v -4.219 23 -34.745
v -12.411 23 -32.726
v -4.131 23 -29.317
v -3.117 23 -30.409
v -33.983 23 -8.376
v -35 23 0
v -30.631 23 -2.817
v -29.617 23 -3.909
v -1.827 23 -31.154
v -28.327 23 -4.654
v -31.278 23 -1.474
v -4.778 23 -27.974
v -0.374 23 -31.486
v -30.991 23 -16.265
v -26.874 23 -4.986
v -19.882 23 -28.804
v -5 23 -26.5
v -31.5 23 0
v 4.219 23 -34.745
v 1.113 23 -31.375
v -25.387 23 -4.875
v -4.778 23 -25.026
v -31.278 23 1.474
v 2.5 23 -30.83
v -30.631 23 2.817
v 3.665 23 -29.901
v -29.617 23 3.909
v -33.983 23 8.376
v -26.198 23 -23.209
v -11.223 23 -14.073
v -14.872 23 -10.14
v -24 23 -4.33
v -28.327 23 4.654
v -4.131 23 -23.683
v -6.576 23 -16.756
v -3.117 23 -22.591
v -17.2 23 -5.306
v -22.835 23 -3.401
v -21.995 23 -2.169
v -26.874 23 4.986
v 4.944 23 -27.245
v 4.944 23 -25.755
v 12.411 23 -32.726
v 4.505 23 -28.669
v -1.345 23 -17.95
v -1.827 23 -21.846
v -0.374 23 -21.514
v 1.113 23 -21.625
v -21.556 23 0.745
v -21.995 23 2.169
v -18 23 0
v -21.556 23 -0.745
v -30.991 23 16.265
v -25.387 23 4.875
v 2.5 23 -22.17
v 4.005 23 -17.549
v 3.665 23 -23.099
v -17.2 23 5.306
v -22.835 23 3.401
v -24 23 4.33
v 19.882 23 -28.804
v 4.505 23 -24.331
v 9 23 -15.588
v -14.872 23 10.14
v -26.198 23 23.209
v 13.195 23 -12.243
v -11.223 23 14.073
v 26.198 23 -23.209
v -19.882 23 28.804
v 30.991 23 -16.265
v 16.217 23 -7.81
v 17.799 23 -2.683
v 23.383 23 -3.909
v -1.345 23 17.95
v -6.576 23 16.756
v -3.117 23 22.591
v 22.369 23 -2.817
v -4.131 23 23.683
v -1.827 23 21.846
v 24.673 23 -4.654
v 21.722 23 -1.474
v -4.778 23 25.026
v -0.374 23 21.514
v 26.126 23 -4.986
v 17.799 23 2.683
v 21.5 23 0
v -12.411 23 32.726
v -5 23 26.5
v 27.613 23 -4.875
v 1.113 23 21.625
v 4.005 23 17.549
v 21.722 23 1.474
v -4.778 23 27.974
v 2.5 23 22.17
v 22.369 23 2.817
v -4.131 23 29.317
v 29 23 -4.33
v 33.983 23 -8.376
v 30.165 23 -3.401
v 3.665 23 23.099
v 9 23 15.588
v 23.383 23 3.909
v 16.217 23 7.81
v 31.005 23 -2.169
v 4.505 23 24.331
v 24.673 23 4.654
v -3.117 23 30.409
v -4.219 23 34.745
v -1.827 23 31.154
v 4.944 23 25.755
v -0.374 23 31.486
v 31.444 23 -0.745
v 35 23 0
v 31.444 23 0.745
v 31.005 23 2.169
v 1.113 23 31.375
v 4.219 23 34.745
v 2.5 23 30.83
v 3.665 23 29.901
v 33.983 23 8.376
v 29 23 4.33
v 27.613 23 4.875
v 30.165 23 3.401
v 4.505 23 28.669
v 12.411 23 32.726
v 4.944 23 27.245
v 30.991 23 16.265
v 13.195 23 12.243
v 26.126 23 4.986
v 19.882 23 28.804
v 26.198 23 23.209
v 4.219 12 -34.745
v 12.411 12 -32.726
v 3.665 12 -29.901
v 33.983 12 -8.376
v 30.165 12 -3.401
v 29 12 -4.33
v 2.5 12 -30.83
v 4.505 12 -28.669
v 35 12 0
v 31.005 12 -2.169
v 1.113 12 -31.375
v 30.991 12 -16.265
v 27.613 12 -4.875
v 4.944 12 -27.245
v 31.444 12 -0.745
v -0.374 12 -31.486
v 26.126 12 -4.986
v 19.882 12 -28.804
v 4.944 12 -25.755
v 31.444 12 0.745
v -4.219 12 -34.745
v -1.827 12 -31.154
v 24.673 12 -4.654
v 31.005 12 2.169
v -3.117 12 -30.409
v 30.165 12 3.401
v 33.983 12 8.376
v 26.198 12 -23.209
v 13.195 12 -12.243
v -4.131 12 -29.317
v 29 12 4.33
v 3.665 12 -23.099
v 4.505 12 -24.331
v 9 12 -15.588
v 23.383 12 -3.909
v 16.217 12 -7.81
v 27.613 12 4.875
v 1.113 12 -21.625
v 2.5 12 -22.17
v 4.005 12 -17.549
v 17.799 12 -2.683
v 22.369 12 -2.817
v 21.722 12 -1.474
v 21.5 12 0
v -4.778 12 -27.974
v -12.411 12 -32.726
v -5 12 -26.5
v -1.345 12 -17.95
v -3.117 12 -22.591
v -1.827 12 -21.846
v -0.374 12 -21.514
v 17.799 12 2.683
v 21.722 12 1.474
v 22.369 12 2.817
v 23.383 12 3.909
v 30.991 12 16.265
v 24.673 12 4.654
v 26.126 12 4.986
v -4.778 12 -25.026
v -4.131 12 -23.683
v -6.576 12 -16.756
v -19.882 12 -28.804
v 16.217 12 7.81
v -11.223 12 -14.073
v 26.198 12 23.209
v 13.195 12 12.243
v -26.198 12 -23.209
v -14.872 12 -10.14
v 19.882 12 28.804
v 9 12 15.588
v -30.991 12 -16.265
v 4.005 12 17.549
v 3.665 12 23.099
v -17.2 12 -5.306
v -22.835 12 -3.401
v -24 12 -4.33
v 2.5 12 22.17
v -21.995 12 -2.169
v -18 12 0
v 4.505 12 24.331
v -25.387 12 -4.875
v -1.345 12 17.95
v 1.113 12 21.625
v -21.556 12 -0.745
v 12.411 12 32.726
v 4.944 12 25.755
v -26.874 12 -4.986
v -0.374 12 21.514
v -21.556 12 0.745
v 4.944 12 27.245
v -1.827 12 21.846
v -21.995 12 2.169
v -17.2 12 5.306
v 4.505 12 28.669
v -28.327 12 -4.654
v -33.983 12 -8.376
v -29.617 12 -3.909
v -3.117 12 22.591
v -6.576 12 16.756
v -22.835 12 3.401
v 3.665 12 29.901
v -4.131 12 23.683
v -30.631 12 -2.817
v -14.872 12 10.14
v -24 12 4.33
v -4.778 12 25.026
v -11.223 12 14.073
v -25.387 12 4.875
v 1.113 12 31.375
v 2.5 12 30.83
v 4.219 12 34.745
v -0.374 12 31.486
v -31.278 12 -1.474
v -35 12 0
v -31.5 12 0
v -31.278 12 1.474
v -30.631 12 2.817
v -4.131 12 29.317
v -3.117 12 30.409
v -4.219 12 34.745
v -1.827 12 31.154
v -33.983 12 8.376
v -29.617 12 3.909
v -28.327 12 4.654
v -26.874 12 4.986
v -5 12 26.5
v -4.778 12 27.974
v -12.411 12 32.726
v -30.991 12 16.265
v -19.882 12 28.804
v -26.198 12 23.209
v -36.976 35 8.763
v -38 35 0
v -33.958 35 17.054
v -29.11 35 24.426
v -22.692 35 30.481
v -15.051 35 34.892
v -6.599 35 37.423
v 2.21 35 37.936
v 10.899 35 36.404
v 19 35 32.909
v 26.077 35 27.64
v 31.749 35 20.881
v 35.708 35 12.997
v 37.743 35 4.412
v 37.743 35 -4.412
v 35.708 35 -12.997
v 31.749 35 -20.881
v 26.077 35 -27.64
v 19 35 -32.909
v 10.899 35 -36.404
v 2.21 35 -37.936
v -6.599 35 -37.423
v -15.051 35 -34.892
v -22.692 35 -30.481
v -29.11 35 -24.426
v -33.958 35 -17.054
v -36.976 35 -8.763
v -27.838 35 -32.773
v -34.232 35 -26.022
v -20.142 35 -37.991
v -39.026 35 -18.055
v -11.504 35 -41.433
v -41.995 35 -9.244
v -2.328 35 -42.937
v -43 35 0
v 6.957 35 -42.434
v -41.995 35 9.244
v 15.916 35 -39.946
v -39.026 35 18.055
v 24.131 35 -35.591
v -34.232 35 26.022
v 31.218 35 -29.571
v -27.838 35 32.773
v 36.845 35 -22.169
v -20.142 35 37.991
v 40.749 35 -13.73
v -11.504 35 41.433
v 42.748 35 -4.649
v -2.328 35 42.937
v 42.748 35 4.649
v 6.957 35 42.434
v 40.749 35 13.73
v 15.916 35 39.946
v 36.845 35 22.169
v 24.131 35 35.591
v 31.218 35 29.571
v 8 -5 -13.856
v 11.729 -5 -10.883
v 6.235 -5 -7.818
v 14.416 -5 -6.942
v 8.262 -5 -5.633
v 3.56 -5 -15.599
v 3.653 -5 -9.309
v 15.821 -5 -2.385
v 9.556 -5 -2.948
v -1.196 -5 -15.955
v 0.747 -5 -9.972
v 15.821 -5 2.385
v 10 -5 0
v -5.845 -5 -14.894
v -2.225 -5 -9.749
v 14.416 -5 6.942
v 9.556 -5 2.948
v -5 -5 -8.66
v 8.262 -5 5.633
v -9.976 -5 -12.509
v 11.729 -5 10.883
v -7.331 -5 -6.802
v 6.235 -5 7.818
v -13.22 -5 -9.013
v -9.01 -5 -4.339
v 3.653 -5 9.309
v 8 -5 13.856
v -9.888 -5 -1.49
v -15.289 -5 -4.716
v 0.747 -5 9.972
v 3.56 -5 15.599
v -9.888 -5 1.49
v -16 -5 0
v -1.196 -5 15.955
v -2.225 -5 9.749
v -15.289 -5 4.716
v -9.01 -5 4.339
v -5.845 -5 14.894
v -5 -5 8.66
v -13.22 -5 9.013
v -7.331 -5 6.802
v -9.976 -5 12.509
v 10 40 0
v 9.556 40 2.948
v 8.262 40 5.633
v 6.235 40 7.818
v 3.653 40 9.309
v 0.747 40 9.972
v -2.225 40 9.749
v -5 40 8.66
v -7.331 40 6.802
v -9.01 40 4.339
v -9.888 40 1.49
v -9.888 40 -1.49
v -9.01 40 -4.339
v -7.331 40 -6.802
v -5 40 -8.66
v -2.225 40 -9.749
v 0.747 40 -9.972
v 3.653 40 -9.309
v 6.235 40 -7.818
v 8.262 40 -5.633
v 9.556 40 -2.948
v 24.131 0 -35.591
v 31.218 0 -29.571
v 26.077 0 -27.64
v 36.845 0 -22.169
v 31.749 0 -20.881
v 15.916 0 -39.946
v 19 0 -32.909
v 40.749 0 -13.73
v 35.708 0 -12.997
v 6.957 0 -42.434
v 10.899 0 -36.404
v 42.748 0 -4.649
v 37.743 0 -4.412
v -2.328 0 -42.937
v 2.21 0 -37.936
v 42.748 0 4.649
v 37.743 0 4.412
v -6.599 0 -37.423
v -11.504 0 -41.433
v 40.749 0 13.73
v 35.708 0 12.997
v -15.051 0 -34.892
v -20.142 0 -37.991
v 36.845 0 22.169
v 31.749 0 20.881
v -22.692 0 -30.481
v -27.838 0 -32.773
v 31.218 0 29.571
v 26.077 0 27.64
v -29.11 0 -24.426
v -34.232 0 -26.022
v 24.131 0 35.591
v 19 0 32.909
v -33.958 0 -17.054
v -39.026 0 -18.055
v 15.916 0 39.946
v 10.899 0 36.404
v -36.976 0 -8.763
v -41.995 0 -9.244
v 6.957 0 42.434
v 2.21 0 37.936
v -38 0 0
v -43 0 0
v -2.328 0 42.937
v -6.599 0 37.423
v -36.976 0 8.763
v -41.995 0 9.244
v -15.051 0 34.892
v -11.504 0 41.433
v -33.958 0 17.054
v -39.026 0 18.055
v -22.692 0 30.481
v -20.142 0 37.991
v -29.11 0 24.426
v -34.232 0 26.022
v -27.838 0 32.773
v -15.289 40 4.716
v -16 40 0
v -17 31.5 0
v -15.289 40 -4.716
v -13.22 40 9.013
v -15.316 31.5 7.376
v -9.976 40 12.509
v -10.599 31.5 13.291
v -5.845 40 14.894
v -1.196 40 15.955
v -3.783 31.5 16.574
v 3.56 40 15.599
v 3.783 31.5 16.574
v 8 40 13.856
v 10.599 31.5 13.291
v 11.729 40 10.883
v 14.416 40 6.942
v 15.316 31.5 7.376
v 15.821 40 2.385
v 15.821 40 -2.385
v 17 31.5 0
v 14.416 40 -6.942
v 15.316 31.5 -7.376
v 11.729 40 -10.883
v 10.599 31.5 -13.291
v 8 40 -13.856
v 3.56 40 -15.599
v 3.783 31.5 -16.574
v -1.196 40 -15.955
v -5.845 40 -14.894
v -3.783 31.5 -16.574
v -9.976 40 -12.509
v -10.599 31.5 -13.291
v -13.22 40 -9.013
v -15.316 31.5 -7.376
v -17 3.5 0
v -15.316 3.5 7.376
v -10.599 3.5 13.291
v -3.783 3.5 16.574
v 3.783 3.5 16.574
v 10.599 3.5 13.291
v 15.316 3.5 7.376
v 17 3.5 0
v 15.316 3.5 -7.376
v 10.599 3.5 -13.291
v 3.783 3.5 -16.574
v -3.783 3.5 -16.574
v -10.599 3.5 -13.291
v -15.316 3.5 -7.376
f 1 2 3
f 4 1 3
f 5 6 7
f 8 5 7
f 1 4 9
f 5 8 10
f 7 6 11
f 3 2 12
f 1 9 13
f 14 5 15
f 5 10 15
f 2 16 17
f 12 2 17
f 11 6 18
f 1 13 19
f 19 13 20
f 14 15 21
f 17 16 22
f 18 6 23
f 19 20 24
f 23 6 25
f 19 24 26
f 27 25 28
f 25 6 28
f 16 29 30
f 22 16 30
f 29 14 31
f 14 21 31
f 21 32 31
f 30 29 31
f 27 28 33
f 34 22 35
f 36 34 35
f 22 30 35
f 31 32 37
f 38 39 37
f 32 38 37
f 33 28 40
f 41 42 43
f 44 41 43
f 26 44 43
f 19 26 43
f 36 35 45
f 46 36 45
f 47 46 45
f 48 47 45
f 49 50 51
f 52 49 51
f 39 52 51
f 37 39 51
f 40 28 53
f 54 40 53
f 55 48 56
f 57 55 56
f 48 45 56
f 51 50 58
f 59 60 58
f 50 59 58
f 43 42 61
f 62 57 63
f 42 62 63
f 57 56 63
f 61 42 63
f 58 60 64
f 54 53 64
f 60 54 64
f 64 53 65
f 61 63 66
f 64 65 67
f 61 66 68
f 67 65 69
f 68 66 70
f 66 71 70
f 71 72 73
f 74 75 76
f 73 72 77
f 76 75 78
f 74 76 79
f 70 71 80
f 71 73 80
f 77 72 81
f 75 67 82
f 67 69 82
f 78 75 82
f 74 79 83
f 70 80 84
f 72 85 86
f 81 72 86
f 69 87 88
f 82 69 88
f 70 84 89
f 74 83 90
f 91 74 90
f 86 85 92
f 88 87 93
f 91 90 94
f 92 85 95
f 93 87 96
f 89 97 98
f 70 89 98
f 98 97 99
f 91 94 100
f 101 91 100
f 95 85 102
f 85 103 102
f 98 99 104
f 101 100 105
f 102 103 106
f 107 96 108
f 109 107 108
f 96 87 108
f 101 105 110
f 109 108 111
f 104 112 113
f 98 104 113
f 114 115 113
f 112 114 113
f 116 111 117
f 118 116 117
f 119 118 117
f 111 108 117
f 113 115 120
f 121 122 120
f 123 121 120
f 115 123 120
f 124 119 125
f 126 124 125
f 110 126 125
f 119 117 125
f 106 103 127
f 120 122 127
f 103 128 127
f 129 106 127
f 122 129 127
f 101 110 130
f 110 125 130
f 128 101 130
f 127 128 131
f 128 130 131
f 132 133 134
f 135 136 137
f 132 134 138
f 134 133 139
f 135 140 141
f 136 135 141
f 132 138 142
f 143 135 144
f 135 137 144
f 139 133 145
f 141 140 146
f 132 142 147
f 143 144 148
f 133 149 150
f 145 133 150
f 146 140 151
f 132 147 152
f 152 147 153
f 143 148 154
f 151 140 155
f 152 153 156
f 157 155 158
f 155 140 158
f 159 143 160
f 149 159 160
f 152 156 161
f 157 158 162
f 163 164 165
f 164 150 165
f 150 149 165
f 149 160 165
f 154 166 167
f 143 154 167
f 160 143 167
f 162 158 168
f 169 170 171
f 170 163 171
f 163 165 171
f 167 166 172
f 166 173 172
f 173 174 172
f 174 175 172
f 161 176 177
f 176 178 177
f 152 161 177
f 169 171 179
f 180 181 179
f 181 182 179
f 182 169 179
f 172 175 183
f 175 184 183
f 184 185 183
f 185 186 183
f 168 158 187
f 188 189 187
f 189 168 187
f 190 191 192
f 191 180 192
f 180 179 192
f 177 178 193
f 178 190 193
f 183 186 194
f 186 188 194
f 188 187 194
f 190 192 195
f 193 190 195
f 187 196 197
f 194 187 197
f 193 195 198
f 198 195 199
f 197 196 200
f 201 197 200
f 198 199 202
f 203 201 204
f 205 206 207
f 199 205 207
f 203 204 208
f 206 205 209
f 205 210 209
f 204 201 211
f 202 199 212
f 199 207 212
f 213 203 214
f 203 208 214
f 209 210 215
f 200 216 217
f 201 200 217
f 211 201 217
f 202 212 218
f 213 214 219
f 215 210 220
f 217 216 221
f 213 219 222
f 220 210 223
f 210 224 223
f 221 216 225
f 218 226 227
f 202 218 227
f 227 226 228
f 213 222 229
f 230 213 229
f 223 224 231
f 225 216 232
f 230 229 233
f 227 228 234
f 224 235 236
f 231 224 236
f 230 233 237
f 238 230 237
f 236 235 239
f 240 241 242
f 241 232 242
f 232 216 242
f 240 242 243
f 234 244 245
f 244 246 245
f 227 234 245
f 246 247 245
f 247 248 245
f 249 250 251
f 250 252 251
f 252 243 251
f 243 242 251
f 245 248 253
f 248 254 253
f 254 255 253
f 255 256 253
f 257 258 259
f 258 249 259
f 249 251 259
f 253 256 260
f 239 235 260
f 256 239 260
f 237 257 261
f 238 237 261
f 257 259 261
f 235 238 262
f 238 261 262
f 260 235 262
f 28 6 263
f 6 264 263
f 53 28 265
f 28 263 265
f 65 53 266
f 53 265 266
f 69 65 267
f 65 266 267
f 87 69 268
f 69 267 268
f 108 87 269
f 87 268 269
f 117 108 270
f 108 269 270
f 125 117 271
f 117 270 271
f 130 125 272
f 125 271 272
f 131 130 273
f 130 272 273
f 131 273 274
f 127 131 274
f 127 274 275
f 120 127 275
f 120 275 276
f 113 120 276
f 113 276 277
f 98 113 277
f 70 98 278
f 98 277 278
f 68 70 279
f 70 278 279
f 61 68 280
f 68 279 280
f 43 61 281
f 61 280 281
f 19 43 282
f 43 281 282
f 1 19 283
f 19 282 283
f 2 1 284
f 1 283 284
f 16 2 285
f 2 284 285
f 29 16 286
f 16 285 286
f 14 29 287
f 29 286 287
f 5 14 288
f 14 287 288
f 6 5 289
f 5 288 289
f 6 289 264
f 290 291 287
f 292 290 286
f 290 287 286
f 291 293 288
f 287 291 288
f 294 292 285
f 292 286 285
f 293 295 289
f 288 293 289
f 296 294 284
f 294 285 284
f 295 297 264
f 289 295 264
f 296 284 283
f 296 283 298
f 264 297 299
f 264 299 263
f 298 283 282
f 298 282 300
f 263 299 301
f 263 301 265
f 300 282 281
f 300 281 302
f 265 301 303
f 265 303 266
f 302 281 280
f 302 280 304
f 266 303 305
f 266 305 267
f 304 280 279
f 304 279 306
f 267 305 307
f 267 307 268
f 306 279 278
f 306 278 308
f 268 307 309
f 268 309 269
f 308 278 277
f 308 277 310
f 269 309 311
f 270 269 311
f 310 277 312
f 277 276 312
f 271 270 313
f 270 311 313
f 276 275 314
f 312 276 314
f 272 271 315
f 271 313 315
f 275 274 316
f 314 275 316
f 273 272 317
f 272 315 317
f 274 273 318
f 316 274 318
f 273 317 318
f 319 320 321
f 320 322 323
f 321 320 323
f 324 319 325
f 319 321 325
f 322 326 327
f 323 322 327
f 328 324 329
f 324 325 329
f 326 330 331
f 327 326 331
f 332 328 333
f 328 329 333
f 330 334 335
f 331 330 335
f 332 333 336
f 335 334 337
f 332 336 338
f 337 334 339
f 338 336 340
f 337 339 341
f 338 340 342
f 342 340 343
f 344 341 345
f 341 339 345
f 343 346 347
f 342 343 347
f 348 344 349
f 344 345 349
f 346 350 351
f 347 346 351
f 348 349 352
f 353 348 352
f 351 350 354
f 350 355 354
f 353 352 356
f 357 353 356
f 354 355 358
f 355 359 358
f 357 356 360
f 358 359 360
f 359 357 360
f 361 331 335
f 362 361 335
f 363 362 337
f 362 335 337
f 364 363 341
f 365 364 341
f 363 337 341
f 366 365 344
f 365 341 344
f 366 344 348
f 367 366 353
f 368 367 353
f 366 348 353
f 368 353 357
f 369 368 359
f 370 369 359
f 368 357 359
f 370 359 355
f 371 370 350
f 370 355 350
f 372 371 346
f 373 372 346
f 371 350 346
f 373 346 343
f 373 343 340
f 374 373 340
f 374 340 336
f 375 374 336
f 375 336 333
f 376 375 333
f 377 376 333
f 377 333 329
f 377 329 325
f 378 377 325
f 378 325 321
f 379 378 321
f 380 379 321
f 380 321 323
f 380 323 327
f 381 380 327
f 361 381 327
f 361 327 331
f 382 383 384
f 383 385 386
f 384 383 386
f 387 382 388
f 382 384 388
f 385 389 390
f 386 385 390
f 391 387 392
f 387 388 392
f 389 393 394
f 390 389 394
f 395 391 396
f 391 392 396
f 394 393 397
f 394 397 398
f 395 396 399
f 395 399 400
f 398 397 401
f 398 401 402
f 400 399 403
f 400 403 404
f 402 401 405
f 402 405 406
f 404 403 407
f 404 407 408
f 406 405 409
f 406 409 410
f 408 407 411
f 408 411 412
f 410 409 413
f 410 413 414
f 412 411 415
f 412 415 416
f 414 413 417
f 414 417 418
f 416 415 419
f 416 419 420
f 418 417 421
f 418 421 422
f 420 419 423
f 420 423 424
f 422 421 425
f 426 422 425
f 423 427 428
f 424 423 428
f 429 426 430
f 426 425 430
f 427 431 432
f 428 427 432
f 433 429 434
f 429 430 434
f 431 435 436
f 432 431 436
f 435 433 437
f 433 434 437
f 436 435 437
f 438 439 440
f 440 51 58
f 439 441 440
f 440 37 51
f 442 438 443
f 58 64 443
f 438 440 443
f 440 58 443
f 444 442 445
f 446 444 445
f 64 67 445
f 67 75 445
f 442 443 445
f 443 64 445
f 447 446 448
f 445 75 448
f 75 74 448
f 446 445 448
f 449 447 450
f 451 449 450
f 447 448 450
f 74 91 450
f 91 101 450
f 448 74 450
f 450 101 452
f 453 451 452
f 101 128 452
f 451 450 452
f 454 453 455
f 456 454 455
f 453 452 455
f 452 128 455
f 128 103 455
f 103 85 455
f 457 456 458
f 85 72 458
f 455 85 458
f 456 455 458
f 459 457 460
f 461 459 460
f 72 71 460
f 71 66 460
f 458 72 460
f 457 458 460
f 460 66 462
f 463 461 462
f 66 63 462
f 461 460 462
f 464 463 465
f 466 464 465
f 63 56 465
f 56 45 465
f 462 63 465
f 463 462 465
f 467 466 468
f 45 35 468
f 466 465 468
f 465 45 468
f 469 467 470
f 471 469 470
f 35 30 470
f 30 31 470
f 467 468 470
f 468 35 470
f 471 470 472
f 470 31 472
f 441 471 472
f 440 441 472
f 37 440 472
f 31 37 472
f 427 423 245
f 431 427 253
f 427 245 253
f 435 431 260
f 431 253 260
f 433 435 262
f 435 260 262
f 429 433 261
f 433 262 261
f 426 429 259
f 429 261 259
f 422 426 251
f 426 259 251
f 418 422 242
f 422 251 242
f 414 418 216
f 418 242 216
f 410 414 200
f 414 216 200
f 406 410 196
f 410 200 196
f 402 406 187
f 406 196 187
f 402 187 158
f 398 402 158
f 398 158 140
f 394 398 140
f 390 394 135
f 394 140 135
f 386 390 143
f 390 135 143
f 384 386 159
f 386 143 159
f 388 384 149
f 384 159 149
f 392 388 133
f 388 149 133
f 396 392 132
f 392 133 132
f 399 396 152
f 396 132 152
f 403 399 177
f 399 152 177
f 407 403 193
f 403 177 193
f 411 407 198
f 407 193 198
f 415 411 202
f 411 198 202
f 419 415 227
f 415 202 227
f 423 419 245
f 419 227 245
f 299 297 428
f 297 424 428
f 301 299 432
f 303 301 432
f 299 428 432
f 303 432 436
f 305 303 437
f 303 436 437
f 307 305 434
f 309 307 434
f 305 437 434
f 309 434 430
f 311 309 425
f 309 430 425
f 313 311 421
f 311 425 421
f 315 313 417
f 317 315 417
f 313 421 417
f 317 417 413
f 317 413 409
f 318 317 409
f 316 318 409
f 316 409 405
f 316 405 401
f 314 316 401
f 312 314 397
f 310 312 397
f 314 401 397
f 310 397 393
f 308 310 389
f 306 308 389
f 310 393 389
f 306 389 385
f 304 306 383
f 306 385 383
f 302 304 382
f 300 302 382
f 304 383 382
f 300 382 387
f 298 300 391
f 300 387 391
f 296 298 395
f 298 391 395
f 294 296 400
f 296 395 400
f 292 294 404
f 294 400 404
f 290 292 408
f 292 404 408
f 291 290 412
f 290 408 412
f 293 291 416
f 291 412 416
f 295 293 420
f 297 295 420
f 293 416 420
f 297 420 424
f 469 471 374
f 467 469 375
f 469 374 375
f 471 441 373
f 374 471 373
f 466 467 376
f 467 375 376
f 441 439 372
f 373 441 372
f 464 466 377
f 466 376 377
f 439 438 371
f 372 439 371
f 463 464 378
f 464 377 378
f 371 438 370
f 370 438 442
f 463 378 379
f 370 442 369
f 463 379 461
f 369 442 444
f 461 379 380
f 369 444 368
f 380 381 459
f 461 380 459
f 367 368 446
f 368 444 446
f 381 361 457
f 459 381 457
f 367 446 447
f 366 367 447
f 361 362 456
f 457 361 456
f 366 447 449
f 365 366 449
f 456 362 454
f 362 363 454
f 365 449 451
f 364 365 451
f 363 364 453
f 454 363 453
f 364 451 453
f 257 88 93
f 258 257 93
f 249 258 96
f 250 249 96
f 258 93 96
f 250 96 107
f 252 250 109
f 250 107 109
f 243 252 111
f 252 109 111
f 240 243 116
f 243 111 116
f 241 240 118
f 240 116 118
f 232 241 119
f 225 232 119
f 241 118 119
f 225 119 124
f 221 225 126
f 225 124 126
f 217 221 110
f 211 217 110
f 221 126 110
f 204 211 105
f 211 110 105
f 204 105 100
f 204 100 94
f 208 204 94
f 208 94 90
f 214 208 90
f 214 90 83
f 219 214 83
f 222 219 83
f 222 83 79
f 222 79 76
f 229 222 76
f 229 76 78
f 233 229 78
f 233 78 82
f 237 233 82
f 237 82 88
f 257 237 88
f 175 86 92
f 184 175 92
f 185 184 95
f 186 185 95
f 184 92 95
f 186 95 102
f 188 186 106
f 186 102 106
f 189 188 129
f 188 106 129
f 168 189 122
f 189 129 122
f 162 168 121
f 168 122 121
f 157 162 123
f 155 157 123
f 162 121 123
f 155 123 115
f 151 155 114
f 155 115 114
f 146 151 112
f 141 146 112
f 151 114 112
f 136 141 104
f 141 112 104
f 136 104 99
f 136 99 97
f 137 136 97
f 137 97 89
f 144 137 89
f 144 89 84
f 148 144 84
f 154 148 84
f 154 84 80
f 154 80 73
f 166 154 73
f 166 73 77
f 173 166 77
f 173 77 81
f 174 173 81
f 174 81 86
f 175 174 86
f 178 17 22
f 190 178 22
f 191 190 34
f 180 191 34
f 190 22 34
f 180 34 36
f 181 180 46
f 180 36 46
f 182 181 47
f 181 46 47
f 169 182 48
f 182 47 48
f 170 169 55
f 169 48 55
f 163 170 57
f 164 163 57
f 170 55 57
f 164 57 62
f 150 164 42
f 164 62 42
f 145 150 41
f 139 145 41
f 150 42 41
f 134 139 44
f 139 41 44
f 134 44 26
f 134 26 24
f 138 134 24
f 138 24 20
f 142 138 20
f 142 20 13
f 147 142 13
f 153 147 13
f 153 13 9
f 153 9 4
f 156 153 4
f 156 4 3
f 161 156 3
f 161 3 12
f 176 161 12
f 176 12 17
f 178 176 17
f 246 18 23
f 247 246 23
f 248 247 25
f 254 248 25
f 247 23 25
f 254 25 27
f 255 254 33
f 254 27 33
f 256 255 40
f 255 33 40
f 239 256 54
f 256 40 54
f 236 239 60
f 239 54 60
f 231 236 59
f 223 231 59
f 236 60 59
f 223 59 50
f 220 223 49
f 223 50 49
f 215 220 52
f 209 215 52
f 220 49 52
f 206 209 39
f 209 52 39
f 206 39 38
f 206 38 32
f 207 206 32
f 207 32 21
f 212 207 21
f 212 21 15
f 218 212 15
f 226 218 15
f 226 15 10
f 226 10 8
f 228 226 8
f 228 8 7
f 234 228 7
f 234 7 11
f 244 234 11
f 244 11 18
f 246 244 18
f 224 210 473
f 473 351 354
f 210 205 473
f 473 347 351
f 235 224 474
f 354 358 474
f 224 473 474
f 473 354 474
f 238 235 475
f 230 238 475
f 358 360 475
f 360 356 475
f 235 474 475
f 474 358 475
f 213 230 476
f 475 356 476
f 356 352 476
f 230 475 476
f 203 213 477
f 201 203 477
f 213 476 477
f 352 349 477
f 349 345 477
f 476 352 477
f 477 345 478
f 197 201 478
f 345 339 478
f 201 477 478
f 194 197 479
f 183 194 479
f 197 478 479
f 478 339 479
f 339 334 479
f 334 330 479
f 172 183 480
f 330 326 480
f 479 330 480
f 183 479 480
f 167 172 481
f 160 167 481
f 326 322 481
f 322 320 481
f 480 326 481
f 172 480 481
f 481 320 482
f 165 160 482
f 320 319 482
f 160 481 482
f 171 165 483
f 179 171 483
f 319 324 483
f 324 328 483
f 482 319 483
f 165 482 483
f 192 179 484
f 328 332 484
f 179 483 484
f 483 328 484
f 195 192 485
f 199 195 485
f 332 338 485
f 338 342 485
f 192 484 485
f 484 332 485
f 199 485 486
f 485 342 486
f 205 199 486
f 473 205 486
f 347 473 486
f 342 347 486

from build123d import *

# Parameters (mm, degrees)
SKETCH2_R          = 10
CUT_EXTRUDE1_DEPTH = 46
SKETCH3_R          = 5
CUT_EXTRUDE2_DEPTH = 29


with BuildPart() as part:
    # Sketch1 → Revolve1 (revolve)
    with BuildSketch(Plane(origin=(0, 0, 0), x_dir=(0, 1, 0), z_dir=(0, 0, 1))):
        Polygon((0, 0), (35, 0), (40, 0), (40, 16), (23, 18), (23, 35), (35, 38), (35, 43), (0, 43), (0, 38), (12, 35), (12, 18), (-5, 16), (-5, 0), align=None)
    revolve(axis=Axis((0, 0, 0), (0, 1, 0)))

    # Sketch2 → Cut-Extrude1 (cut, through all)
    with BuildSketch(Plane.XZ.offset(5)):
        Circle(SKETCH2_R)
    extrude(amount=-CUT_EXTRUDE1_DEPTH, mode=Mode.SUBTRACT)

    # Sketch3 → Cut-Extrude2 (cut, through all)
    with BuildSketch(Plane(origin=(0, 23, 0), x_dir=(-1, 0, 0), z_dir=(0, 1, 0))):
        with Locations((0, 26.5)):
            Circle(SKETCH3_R)
        with Locations((26.5, 0)):
            Circle(SKETCH3_R)
        with Locations((0, -26.5)):
            Circle(SKETCH3_R)
        with Locations((-26.5, 0)):
            Circle(SKETCH3_R)
    extrude(amount=-CUT_EXTRUDE2_DEPTH, mode=Mode.SUBTRACT)


solid = part.part
